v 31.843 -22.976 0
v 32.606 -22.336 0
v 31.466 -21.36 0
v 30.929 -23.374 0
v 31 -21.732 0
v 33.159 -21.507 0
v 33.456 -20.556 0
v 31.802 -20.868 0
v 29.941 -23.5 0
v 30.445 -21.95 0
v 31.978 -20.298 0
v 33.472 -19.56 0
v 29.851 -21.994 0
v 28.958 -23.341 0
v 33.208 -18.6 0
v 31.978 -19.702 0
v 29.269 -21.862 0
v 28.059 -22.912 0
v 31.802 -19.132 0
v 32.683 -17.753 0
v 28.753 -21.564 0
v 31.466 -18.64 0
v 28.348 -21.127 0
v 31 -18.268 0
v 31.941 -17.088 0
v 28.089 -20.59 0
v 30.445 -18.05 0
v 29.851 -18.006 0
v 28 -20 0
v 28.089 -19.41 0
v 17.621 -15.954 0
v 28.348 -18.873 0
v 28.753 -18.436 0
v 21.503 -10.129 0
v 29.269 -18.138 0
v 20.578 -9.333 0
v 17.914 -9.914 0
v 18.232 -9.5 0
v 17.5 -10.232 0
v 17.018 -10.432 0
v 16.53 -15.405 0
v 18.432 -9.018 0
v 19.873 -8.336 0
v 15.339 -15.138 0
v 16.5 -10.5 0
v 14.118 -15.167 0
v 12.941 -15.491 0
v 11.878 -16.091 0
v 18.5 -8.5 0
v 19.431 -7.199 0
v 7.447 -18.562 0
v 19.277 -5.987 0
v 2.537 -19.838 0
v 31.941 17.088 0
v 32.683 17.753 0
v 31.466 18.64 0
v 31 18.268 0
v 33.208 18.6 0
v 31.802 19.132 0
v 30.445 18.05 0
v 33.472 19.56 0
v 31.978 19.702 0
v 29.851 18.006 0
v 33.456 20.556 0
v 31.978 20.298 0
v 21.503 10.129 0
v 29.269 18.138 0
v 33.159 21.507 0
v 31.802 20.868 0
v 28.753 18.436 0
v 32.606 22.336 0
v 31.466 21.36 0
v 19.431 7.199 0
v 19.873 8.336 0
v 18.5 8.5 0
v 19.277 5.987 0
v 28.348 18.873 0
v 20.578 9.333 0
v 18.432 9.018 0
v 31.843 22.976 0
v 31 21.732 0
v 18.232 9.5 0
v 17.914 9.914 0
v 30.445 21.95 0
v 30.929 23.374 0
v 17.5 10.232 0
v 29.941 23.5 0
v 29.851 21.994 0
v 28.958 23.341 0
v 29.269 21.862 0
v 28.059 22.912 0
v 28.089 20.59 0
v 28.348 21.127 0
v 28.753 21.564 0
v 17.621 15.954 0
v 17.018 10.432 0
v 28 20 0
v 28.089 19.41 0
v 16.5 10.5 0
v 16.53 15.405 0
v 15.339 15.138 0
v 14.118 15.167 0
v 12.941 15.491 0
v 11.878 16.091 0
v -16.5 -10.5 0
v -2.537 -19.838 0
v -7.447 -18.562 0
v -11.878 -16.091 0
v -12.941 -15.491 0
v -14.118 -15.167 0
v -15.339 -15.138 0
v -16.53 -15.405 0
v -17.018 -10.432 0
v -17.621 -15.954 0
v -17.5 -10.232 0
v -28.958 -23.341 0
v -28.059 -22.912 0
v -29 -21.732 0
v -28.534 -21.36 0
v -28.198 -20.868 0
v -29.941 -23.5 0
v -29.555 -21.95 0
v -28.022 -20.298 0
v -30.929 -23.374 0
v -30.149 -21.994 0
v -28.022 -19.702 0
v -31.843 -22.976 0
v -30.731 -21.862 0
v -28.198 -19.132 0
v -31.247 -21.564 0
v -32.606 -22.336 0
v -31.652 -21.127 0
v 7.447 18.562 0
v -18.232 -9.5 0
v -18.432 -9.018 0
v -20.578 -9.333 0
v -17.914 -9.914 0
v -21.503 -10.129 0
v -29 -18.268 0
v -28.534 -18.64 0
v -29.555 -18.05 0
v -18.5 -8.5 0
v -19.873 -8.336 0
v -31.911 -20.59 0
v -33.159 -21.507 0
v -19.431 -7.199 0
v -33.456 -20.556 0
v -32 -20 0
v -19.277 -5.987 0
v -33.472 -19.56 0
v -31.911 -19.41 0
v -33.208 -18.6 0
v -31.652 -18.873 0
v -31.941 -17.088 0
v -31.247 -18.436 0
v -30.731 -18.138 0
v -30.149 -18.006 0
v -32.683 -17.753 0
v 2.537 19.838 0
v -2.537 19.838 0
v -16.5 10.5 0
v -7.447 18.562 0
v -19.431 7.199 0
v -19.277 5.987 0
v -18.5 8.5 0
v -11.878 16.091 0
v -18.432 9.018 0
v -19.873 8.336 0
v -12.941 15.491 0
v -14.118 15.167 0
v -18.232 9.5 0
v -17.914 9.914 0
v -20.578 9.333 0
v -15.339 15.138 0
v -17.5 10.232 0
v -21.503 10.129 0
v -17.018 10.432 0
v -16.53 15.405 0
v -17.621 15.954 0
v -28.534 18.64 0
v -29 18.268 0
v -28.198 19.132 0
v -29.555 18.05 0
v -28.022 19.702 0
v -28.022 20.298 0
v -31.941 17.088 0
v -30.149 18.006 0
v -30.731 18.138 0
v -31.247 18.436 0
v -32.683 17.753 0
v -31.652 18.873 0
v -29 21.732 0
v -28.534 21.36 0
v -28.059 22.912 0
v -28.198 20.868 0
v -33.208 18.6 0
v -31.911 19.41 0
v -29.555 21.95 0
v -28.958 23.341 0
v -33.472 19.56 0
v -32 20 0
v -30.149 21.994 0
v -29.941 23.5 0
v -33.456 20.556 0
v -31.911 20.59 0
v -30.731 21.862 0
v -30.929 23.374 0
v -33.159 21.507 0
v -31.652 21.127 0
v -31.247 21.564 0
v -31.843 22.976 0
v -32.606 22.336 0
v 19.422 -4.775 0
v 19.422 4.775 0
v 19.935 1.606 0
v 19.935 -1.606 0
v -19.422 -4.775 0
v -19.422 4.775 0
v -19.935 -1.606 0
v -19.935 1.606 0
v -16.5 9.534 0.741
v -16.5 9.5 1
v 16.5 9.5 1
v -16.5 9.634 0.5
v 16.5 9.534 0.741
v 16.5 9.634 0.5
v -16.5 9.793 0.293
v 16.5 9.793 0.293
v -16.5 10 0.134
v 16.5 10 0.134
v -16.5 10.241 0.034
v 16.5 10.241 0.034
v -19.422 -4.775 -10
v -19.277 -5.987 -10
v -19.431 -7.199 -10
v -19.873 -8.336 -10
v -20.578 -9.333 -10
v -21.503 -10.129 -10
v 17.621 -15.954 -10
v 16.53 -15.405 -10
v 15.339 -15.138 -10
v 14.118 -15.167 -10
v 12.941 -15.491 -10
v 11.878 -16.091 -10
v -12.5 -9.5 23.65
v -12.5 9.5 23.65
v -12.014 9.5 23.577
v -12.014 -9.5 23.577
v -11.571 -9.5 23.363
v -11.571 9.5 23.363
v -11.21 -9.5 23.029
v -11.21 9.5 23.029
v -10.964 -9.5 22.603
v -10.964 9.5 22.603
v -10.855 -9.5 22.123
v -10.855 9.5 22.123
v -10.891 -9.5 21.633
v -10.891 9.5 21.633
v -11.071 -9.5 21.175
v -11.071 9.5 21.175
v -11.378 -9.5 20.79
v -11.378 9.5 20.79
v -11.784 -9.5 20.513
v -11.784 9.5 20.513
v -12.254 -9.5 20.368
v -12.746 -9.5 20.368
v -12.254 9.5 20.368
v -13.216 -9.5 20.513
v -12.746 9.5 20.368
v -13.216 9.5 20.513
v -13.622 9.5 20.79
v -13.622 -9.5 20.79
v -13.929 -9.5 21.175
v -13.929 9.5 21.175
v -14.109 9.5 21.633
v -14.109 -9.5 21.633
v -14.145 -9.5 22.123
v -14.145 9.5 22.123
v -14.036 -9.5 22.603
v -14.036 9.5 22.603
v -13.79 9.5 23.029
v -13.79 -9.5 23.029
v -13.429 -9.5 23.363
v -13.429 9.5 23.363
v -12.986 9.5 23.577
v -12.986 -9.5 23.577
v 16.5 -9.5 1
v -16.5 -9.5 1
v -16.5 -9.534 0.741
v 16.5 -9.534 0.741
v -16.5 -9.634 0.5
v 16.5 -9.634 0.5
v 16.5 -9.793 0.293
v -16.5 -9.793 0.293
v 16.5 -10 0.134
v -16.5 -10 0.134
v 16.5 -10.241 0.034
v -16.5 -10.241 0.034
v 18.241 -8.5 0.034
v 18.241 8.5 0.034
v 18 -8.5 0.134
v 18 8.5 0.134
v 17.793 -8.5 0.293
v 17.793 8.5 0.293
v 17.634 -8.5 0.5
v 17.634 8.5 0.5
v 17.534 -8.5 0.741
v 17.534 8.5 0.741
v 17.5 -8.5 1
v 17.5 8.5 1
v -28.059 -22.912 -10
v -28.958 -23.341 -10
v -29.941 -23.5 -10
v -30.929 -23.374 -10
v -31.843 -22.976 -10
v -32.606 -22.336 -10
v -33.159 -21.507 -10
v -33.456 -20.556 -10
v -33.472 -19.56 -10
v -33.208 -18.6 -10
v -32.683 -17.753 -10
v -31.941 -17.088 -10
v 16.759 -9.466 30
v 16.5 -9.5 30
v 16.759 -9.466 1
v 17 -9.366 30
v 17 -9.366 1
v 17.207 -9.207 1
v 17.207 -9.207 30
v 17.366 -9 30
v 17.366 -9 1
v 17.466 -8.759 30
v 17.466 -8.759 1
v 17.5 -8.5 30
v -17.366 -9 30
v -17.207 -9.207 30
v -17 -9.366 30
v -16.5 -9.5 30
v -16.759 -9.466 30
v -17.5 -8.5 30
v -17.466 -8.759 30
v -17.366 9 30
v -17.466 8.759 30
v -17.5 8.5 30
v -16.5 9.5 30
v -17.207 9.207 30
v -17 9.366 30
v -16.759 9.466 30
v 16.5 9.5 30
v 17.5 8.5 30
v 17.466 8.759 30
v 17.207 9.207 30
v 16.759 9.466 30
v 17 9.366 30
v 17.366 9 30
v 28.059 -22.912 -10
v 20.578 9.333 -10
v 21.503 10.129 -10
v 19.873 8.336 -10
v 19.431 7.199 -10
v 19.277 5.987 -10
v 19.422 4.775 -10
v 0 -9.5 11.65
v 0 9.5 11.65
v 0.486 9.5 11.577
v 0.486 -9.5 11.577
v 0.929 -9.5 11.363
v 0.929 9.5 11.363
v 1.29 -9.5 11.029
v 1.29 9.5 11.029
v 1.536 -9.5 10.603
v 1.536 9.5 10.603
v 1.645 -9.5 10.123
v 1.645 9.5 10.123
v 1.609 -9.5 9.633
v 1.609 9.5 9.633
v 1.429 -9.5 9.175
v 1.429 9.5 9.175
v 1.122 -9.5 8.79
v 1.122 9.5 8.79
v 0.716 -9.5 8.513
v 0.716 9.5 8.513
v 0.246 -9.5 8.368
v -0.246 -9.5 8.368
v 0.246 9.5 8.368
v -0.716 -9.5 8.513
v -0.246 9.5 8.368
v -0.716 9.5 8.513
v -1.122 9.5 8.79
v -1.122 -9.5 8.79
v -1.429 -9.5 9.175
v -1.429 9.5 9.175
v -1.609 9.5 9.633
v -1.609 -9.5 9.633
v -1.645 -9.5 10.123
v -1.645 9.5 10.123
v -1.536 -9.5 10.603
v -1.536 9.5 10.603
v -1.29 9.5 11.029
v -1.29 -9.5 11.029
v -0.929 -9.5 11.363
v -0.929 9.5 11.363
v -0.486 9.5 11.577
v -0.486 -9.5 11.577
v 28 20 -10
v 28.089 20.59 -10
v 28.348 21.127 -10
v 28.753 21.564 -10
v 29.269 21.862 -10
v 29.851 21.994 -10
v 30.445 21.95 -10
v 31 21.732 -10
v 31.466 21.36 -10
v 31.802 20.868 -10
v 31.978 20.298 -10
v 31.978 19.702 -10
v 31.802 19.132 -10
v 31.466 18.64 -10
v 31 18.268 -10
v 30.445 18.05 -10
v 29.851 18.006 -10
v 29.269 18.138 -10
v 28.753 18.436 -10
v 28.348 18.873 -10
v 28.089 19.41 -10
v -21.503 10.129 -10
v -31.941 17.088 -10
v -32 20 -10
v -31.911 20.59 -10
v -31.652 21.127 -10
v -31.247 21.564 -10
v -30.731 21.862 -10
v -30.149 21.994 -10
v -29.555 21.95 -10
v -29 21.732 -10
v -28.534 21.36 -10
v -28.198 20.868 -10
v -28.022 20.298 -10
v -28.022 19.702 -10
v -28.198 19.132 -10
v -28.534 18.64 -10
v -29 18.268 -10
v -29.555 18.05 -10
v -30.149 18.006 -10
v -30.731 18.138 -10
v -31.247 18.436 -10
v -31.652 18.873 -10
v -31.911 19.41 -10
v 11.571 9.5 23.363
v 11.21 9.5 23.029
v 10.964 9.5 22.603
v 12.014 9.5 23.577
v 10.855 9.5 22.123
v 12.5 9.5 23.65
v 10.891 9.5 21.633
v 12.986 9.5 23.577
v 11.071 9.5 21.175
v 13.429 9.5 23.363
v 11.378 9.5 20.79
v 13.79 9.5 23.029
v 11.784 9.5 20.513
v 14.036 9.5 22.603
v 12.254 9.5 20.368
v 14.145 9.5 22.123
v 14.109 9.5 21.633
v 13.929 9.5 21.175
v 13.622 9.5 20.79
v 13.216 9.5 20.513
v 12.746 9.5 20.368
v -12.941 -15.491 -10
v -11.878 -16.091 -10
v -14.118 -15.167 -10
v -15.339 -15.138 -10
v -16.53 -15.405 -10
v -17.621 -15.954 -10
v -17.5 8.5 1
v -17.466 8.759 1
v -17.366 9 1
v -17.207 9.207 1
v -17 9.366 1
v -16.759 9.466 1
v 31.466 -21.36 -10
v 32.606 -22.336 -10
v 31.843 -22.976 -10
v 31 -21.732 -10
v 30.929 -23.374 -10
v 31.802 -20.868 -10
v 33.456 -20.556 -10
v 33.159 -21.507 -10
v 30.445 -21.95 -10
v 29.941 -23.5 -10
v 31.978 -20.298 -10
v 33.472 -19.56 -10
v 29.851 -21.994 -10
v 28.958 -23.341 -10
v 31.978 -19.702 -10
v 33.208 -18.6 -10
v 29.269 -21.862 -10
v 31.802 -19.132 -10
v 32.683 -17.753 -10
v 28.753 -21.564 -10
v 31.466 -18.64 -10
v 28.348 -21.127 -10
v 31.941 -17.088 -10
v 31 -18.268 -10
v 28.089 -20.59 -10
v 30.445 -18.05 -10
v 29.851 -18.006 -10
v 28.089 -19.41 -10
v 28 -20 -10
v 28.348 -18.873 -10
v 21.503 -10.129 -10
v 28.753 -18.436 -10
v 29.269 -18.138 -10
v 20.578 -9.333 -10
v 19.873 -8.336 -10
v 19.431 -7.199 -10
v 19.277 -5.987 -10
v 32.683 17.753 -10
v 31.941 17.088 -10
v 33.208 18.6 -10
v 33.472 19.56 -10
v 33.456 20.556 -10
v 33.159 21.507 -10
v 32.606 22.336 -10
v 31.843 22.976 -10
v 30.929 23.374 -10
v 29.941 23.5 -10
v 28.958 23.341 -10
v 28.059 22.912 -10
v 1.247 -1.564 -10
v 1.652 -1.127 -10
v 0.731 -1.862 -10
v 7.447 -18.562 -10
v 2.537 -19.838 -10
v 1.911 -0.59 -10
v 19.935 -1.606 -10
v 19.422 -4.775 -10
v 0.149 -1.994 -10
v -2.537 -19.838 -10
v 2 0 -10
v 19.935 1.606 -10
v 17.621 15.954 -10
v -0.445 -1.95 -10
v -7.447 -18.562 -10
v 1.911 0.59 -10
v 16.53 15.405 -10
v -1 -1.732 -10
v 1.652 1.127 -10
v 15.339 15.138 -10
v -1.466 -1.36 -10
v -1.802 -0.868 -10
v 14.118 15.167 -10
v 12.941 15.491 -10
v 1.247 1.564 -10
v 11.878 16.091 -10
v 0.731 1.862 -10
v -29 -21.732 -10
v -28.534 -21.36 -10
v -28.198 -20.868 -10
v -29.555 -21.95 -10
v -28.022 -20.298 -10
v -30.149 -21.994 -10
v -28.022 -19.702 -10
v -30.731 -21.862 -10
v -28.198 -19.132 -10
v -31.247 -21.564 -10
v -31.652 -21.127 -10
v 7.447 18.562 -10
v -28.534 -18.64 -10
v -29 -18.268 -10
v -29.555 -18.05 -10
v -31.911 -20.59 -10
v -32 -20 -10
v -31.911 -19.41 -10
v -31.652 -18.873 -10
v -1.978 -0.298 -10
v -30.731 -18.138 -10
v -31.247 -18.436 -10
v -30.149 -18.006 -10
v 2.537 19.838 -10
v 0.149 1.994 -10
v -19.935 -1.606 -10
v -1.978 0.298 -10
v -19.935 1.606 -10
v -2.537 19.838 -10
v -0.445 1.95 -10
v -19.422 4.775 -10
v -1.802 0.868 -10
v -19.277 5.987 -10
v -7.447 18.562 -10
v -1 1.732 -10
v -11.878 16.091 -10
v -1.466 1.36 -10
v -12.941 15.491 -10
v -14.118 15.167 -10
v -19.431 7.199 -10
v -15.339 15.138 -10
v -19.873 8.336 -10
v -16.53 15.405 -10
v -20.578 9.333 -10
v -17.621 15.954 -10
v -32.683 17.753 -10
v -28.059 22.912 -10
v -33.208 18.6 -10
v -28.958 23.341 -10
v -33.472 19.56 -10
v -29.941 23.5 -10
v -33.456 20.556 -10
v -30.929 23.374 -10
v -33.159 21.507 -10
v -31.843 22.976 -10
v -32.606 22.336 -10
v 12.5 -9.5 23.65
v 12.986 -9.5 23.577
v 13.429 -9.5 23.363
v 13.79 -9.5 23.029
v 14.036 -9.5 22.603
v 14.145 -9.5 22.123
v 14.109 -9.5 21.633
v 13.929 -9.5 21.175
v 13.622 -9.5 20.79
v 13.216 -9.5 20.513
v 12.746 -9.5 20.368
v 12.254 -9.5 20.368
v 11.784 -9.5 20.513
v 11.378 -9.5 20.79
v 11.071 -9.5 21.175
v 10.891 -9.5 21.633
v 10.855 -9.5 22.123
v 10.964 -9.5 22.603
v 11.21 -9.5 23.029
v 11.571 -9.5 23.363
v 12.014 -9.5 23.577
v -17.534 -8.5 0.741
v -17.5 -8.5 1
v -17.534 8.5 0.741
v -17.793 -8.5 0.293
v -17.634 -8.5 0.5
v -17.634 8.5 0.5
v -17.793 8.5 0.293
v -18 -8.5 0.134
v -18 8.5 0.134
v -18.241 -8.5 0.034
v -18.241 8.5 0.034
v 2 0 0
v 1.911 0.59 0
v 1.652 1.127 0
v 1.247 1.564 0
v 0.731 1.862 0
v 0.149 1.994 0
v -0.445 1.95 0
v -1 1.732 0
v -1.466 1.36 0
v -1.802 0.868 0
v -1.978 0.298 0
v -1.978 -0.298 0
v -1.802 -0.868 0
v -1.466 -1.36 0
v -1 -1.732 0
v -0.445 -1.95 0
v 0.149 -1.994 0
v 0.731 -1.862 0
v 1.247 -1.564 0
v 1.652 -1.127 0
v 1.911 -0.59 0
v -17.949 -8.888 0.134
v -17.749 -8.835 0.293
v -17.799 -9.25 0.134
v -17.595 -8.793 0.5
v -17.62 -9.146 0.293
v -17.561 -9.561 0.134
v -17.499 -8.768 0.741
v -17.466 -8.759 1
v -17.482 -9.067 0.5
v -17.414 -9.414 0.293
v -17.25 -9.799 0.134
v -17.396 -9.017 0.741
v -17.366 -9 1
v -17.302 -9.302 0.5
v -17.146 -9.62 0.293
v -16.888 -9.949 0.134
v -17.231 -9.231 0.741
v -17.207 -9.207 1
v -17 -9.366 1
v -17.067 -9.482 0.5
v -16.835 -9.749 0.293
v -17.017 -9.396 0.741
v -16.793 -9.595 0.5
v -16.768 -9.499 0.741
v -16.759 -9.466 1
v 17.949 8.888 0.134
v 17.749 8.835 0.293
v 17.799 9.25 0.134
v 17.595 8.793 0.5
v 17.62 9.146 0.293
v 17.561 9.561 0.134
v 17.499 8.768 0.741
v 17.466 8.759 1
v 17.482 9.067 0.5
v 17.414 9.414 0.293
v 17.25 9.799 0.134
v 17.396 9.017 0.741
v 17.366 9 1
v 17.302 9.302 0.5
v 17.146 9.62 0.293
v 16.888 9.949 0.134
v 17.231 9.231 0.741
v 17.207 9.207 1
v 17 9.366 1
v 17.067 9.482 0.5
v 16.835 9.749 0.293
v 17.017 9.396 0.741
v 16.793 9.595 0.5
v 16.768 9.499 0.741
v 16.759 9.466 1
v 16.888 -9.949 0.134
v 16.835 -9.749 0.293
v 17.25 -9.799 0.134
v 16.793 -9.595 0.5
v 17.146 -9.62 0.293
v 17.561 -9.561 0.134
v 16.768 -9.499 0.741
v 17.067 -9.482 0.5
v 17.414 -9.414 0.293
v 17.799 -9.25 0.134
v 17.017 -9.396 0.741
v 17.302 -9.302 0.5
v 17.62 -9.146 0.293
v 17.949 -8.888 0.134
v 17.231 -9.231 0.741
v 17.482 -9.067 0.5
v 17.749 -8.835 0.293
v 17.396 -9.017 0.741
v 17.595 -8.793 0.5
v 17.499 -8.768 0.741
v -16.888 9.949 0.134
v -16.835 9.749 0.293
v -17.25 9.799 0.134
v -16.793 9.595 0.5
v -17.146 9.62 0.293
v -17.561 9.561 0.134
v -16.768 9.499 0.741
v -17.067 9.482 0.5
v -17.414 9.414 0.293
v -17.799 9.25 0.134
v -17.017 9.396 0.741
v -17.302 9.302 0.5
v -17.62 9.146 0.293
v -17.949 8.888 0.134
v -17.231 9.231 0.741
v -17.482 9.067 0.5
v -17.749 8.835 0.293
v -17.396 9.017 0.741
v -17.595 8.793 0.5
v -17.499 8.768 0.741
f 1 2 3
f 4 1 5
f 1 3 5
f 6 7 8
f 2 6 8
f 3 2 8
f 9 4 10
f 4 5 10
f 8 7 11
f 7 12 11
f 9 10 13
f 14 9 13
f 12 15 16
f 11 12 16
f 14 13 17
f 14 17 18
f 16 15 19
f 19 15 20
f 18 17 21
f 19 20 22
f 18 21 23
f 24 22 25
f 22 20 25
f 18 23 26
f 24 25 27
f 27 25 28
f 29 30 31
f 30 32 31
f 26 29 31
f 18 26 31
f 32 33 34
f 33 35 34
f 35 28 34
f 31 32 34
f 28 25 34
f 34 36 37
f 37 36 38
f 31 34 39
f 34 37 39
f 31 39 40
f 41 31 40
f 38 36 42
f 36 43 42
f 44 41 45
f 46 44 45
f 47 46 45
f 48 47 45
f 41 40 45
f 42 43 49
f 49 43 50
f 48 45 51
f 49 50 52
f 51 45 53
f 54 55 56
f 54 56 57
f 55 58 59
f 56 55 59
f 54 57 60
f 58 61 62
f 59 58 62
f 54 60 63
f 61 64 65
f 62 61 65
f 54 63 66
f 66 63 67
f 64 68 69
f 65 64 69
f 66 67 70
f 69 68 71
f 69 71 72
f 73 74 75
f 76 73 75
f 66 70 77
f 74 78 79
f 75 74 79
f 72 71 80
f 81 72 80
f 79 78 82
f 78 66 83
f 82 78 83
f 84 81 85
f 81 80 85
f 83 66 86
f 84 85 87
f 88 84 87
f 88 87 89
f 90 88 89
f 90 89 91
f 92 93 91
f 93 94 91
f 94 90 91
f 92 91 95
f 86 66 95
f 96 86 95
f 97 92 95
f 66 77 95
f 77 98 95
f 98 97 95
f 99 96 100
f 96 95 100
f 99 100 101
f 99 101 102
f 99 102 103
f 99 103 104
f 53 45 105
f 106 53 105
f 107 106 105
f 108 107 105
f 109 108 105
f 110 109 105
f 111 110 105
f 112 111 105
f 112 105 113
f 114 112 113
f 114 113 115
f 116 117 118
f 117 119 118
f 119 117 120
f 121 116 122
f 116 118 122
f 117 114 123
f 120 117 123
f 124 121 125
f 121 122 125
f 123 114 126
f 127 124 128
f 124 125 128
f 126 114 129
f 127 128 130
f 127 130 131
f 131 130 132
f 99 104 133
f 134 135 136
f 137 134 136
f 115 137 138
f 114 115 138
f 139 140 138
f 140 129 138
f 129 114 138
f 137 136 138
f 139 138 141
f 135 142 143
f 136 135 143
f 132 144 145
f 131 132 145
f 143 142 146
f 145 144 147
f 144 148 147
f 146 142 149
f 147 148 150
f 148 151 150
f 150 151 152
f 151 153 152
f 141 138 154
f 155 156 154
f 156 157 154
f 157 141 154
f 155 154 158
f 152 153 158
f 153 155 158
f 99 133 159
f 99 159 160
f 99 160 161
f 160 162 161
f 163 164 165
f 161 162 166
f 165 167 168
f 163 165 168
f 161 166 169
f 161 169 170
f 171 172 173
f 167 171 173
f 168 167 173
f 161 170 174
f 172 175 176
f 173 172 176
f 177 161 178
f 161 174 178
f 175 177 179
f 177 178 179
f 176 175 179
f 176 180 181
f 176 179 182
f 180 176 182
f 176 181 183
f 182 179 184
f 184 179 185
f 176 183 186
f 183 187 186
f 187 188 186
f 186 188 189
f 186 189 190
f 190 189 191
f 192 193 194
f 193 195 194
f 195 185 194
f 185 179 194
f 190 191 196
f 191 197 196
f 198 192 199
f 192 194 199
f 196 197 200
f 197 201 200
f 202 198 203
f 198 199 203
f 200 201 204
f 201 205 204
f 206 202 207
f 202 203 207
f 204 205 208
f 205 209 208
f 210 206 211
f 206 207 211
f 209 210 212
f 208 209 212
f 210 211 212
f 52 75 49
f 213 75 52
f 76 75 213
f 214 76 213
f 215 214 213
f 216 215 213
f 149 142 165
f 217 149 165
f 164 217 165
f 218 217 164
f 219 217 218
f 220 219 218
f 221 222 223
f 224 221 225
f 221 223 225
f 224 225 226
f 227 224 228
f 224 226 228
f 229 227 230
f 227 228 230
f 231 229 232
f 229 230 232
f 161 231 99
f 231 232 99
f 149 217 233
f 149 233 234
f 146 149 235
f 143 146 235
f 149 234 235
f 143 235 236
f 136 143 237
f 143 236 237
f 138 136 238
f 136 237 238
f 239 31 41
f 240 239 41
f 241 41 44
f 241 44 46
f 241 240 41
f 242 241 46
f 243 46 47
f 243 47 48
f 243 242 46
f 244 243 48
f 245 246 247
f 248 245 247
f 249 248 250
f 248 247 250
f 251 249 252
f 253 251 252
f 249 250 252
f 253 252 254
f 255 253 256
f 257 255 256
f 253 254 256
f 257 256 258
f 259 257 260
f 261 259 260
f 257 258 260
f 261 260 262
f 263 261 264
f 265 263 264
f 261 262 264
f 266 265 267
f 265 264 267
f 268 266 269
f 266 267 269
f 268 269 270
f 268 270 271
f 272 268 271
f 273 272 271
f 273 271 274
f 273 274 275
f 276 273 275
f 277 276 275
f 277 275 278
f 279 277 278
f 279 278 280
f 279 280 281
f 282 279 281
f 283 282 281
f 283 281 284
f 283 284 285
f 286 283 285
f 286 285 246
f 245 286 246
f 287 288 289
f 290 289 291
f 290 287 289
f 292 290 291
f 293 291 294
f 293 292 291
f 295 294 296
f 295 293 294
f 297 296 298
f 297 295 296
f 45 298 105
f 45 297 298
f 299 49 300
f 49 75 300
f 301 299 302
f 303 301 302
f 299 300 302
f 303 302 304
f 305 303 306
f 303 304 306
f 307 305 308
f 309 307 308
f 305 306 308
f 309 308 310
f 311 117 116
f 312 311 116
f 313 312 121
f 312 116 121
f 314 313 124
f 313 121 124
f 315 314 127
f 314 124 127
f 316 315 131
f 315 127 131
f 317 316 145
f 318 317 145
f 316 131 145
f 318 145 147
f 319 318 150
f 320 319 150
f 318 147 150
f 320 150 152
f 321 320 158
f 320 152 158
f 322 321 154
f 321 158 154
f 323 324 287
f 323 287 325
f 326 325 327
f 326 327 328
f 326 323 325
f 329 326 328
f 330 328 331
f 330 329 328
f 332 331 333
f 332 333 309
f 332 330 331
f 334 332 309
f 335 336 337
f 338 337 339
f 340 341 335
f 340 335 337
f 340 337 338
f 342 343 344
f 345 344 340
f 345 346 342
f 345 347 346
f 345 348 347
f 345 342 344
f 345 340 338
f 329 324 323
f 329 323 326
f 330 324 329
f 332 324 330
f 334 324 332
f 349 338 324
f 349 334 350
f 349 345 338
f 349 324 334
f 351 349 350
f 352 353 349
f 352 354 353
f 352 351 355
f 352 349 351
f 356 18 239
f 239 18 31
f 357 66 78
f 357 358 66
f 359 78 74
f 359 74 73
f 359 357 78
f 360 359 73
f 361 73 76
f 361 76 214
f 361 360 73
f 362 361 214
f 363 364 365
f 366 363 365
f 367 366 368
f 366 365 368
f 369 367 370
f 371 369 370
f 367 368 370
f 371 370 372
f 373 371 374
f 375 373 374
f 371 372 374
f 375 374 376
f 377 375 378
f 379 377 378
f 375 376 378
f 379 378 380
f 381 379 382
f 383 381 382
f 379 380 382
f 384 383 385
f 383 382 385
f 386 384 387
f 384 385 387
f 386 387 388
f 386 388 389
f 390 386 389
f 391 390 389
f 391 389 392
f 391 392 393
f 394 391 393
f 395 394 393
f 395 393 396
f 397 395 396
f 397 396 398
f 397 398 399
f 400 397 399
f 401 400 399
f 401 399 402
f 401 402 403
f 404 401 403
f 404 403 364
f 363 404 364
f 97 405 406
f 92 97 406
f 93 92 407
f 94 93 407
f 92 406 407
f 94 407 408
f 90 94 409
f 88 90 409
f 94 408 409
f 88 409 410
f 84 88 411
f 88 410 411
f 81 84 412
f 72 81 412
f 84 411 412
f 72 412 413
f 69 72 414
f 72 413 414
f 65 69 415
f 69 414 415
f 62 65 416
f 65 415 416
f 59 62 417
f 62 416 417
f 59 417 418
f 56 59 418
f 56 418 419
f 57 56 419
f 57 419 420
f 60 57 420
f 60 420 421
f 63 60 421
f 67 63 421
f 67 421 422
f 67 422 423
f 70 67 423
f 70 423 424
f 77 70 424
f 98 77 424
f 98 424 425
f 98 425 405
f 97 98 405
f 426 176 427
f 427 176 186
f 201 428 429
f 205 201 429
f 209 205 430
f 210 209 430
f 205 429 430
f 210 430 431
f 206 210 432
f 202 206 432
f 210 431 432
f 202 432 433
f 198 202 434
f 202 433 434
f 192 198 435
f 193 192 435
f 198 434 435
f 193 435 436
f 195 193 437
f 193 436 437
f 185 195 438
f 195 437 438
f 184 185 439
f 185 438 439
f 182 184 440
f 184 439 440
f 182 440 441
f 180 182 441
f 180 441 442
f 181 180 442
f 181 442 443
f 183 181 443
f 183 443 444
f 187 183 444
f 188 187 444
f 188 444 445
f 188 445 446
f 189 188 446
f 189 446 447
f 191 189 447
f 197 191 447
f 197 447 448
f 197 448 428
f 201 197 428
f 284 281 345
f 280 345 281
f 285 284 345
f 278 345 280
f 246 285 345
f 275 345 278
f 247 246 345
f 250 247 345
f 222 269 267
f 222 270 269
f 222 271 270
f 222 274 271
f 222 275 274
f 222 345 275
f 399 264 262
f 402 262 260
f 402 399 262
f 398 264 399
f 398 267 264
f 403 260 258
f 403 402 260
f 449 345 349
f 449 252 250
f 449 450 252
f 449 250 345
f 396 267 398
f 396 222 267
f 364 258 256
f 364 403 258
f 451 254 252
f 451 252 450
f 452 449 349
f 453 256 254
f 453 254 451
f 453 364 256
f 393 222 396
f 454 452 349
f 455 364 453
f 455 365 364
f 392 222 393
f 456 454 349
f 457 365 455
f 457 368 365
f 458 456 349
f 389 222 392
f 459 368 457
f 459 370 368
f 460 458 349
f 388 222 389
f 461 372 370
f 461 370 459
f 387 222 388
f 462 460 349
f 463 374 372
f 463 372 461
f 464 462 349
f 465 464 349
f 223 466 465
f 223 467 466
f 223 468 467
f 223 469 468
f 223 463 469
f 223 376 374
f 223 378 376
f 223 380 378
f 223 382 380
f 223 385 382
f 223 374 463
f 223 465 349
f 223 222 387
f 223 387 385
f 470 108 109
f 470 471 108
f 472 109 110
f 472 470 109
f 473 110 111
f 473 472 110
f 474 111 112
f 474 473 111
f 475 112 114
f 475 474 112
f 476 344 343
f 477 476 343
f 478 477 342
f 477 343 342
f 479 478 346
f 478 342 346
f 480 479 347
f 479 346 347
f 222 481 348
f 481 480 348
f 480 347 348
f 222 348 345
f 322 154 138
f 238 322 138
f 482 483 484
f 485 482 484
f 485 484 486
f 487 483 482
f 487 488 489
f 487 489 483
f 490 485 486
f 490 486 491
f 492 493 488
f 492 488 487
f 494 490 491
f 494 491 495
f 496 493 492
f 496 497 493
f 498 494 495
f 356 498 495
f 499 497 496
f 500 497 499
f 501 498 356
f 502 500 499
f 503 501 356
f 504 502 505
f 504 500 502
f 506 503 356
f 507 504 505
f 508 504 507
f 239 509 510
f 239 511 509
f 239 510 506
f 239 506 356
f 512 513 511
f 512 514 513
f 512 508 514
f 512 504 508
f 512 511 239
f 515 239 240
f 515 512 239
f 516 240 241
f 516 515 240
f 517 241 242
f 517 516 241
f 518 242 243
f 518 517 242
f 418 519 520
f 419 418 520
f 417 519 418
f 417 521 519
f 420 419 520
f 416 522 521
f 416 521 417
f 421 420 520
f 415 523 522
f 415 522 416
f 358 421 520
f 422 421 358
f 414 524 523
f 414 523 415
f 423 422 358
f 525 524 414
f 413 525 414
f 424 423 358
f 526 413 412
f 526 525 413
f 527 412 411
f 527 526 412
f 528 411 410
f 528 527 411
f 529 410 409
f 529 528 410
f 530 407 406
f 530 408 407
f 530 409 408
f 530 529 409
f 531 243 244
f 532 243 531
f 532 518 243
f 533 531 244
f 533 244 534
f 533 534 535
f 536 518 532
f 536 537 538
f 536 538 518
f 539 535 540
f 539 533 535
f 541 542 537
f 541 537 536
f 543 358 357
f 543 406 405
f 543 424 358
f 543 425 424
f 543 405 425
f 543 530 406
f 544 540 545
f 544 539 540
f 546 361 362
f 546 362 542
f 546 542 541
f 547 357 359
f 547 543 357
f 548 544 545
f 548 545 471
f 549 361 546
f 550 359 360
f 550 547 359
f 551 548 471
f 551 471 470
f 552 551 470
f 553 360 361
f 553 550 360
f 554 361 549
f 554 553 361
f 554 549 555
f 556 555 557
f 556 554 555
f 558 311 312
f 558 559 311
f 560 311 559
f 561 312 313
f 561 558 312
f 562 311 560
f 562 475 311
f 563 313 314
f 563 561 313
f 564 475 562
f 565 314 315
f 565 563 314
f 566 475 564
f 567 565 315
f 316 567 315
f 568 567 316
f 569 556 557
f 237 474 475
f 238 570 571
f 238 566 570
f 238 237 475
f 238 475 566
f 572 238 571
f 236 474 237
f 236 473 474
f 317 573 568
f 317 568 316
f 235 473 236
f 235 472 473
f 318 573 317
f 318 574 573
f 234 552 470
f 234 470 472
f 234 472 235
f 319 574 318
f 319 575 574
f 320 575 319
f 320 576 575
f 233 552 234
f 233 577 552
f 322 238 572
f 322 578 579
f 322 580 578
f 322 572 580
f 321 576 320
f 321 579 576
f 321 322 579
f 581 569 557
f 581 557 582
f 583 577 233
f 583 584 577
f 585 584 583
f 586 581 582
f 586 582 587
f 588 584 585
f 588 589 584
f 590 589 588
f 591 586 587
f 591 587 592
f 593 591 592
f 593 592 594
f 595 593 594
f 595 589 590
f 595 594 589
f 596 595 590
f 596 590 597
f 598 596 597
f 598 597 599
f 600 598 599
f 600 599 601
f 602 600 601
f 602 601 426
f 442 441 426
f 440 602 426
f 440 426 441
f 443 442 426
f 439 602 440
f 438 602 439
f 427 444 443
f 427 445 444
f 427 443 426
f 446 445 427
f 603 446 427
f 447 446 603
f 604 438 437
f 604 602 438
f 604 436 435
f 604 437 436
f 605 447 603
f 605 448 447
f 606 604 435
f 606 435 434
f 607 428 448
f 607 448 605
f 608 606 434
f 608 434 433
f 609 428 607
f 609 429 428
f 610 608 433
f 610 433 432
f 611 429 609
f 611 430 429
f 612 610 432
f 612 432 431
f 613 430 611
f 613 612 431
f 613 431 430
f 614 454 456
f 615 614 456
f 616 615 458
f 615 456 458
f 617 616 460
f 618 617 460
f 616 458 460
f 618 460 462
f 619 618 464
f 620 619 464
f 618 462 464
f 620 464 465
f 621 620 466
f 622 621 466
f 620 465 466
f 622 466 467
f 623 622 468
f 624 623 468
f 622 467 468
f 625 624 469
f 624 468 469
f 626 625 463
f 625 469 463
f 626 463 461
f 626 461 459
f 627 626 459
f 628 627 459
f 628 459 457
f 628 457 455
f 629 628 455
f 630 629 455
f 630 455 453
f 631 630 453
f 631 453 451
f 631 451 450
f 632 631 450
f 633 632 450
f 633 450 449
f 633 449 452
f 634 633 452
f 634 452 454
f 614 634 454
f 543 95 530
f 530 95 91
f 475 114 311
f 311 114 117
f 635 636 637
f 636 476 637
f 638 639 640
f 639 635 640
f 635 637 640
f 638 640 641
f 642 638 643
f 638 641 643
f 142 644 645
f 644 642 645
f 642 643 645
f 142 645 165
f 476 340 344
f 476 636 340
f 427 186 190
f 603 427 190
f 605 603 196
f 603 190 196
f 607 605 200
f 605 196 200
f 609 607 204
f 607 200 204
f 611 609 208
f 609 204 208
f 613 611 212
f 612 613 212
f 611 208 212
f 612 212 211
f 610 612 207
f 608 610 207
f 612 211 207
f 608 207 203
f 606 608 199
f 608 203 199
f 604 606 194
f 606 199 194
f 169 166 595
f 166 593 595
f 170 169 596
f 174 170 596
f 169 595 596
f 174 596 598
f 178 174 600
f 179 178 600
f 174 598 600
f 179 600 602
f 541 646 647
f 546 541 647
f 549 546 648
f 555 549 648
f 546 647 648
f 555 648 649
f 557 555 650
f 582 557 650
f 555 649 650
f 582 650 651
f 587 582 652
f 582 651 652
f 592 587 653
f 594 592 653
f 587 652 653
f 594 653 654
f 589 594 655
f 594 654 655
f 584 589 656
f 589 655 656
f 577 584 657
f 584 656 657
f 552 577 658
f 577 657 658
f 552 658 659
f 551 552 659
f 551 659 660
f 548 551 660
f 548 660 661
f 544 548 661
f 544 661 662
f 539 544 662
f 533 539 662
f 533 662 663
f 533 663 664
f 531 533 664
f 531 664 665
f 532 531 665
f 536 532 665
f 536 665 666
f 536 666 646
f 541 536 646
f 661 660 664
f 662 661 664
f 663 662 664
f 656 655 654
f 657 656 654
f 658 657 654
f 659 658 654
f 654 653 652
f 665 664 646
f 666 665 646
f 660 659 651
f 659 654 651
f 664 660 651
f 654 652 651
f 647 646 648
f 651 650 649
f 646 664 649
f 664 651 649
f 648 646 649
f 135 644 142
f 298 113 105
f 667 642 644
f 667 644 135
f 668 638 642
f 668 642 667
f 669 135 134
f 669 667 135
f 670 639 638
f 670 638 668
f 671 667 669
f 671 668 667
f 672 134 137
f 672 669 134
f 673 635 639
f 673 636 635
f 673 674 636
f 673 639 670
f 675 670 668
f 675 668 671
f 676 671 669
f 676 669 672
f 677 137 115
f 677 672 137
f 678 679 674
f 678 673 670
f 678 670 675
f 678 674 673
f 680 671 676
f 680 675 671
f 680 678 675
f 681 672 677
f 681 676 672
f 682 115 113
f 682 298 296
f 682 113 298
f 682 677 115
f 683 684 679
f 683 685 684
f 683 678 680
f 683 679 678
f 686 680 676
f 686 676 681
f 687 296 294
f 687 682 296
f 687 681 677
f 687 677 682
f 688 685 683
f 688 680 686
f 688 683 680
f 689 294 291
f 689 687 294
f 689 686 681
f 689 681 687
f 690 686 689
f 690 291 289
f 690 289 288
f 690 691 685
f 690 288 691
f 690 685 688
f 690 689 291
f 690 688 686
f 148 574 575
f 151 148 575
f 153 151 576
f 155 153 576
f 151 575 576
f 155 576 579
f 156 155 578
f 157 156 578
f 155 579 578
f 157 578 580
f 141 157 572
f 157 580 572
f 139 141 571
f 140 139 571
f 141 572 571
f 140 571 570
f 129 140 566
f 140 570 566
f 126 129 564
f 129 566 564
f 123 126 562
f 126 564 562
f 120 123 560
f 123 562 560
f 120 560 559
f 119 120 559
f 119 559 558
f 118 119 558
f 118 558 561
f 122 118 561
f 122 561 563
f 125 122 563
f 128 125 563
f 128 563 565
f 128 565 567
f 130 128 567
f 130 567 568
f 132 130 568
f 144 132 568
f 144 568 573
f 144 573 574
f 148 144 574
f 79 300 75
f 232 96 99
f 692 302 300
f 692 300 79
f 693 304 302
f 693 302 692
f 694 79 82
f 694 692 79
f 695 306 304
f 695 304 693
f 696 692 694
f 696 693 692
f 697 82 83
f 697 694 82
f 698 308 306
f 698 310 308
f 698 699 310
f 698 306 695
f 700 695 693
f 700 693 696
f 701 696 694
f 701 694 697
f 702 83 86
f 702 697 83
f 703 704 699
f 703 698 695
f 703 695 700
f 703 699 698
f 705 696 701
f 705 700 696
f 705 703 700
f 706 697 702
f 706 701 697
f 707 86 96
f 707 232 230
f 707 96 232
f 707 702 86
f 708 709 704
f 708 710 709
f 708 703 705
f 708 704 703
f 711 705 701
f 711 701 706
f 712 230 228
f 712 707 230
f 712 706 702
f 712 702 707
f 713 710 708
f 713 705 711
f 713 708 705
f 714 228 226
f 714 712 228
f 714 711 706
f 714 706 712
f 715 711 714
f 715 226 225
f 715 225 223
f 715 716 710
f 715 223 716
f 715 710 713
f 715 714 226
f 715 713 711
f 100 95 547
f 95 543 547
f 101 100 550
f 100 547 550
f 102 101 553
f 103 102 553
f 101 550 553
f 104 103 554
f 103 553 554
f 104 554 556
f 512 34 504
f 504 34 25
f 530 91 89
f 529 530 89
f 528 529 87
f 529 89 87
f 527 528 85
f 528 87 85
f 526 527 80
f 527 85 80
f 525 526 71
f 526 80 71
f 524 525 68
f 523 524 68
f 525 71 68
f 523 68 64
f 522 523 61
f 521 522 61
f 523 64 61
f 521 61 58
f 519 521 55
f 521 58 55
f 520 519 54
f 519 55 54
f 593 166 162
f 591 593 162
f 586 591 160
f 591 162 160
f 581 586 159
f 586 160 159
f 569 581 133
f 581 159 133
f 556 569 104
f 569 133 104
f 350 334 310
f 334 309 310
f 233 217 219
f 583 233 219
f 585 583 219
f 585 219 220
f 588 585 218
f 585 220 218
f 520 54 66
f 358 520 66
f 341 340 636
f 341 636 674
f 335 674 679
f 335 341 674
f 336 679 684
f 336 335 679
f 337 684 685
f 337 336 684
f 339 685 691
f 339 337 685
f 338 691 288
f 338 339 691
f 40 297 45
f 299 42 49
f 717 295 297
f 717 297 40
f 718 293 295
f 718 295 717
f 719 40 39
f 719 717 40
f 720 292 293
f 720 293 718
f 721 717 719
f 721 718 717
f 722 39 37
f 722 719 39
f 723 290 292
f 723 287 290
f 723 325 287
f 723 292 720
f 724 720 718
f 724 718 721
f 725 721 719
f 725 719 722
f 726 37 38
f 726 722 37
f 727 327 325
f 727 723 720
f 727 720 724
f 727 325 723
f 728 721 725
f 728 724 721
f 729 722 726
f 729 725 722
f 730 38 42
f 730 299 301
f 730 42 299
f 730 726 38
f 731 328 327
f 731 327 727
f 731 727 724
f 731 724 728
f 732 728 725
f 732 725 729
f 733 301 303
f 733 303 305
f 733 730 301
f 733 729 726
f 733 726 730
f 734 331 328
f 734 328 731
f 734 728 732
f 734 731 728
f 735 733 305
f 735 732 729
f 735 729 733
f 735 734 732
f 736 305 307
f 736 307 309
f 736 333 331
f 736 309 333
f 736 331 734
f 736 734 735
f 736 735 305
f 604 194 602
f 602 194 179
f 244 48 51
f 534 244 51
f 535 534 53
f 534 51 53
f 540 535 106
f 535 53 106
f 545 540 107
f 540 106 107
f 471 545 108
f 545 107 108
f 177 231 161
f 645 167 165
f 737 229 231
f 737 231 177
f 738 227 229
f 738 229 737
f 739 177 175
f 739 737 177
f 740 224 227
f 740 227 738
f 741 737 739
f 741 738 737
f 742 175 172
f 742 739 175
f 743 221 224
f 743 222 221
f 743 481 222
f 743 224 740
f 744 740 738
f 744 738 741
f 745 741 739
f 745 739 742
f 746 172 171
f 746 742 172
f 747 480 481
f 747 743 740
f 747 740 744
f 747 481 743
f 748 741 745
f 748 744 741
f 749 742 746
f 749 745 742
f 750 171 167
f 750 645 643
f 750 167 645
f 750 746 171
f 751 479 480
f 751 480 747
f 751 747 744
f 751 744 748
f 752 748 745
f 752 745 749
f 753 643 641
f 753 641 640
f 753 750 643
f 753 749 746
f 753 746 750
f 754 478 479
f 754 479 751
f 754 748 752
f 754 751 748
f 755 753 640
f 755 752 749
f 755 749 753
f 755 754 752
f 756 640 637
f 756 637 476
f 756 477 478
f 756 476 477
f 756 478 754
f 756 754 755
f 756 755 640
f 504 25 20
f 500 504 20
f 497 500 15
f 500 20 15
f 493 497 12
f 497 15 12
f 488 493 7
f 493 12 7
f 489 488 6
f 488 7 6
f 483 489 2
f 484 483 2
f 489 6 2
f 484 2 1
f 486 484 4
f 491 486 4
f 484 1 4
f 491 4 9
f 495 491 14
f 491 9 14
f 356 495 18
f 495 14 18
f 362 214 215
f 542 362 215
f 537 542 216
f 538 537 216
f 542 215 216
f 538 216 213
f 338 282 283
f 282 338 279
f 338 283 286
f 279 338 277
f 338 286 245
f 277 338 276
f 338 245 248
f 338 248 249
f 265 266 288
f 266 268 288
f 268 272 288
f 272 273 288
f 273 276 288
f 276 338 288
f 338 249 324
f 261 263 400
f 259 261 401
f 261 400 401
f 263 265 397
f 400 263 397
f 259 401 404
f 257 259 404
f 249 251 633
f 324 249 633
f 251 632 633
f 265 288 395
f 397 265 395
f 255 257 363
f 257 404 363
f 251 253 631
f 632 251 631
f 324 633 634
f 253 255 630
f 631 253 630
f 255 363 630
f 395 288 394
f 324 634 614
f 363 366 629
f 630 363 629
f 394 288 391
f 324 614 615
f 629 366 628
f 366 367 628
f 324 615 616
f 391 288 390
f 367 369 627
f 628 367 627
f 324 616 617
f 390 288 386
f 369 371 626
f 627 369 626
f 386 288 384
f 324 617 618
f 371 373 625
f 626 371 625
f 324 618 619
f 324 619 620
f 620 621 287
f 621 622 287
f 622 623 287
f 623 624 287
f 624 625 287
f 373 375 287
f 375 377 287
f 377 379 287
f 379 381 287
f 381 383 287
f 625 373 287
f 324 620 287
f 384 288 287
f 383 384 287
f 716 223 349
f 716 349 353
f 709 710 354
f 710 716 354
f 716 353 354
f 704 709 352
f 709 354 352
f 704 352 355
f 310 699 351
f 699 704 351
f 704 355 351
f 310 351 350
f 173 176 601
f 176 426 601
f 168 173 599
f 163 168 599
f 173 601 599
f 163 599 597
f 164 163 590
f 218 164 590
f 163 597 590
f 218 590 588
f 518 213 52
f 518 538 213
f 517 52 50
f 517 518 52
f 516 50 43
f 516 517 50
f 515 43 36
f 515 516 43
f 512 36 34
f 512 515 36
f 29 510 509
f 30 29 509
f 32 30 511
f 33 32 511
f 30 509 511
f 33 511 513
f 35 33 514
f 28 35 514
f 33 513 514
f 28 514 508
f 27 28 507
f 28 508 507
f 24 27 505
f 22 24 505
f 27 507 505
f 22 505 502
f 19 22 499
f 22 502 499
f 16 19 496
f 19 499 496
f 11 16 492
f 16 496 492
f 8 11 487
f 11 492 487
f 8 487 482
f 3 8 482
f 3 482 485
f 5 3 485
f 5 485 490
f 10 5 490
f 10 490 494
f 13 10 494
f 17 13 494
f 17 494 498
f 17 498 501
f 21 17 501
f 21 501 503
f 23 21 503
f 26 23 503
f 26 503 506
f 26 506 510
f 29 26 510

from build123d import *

# Parameters (mm, degrees)
BASE_FLANGE1_DEPTH        = 10
F_4_0MM_DOWEL_HOLE1_D     = 4
F_4_0MM_DOWEL_HOLE1_DEPTH = 16
F_4_0MM_DOWEL_HOLE1_TIP   = 1.201721238
FILLET1_R                 = 5
F_4_0MM_DOWEL_HOLE2_D     = 4
F_4_0MM_DOWEL_HOLE2_DEPTH = 16
F_4_0MM_DOWEL_HOLE2_TIP   = 1.201721238
SKETCH17_W                = 35
SKETCH17_H                = 19
BOSS_EXTRUDE1_DEPTH       = 30
SKETCH18_R                = 1.65
CUT_EXTRUDE1_DEPTH        = 56.778580118
FILLET2_R                 = 1


# Sheet-metal steps are written as plain solids
with BuildPart() as part:
    # Sketch1 → Base-Flange1 (new body)
    with BuildSketch(Plane.XY):
        with BuildLine():
            Line((14.442758409, 13.834982094), (28.058549313, 22.91217603))
            ThreePointArc((28.058549313, 22.91217603), (32.91217603, 21.941450687), (31.941450687, 17.08782397))
            Line((31.941450687, 17.08782397), (18.325659783, 8.010630034))
            ThreePointArc((18.325659783, 8.010630034), (20, 0), (18.325659783, -8.010630034))
            Line((18.325659783, -8.010630034), (31.941450687, -17.08782397))
            ThreePointArc((31.941450687, -17.08782397), (32.91217603, -21.941450687), (28.058549313, -22.91217603))
            Line((28.058549313, -22.91217603), (14.442758409, -13.834982094))
            ThreePointArc((14.442758409, -13.834982094), (0, -20), (-14.442758409, -13.834982094))
            Line((-14.442758409, -13.834982094), (-28.058549313, -22.91217603))
            ThreePointArc((-28.058549313, -22.91217603), (-32.91217603, -21.941450687), (-31.941450687, -17.08782397))
            Line((-31.941450687, -17.08782397), (-18.325659783, -8.010630034))
            ThreePointArc((-18.325659783, -8.010630034), (-20, 0), (-18.325659783, 8.010630034))
            Line((-18.325659783, 8.010630034), (-31.941450687, 17.08782397))
            ThreePointArc((-31.941450687, 17.08782397), (-32.91217603, 21.941450687), (-28.058549313, 22.91217603))
            Line((-28.058549313, 22.91217603), (-14.442758409, 13.834982094))
            ThreePointArc((-14.442758409, 13.834982094), (0, 20), (14.442758409, 13.834982094))
        make_face()
    extrude(amount=-BASE_FLANGE1_DEPTH)

    # Ø4.0mm Dowel Hole1
    with Locations(Plane.XY):
        with Locations((-30, 20), (30, -20), (-30, -20), (30, 20)):
            Hole(F_4_0MM_DOWEL_HOLE1_D / 2, depth=F_4_0MM_DOWEL_HOLE1_DEPTH)
            with Locations((0, 0, -(F_4_0MM_DOWEL_HOLE1_DEPTH + F_4_0MM_DOWEL_HOLE1_TIP / 2))):  # 118° drill point
                Cone(0, F_4_0MM_DOWEL_HOLE1_D / 2, F_4_0MM_DOWEL_HOLE1_TIP, mode=Mode.SUBTRACT)

    # Fillet1
    fillet1_edges = [part.edges().sort_by_distance(p)[0] for p in [
        (18.325659783, 8.010630034, -5),
        (18.325659783, -8.010630034, -5),
        (14.442758409, -13.834982094, -5),
        (-14.442758409, -13.834982094, -5),
        (-18.325659783, -8.010630034, -5),
        (-18.325659783, 8.010630034, -5),
        (-14.442758409, 13.834982094, -5),
        (14.442758409, 13.834982094, -5),
    ]]
    fillet(fillet1_edges, radius=FILLET1_R)

    # Ø4.0mm Dowel Hole2
    with Locations(Plane(origin=(0, 0, -10), x_dir=(-1, 0, 0), z_dir=(0, 0, -1))):
        with Locations((0, 0)):
            Hole(F_4_0MM_DOWEL_HOLE2_D / 2, depth=F_4_0MM_DOWEL_HOLE2_DEPTH)
            with Locations((0, 0, -(F_4_0MM_DOWEL_HOLE2_DEPTH + F_4_0MM_DOWEL_HOLE2_TIP / 2))):  # 118° drill point
                Cone(0, F_4_0MM_DOWEL_HOLE2_D / 2, F_4_0MM_DOWEL_HOLE2_TIP, mode=Mode.SUBTRACT)

    # Sketch17 → Boss-Extrude1 (add)
    with BuildSketch(Plane.XY):
        Rectangle(SKETCH17_W, SKETCH17_H)
    extrude(amount=BOSS_EXTRUDE1_DEPTH)

    # Sketch18 → Cut-Extrude1 (cut, through all)
    with BuildSketch(Plane(origin=(0, 9.5, 0), x_dir=(1, 0, 0), z_dir=(0, 1, 0))):
        with Locations(Location((0, -10, 0), (0, 0, 270))):
            Circle(SKETCH18_R)
        with Locations(Location((-12.5, -22, 0), (0, 0, 270))):
            Circle(SKETCH18_R)
        with Locations(Location((12.5, -22, 0), (0, 0, 270))):
            Circle(SKETCH18_R)
    extrude(amount=-CUT_EXTRUDE1_DEPTH, mode=Mode.SUBTRACT)

    # Fillet2
    fillet2_edges = [part.edges().sort_by_distance(p)[0] for p in [
        (17.5, 0, 0),
        (17.5, -9.5, 15),
        (0, 9.5, 0),
        (17.5, 9.5, 15),
        (-17.5, 0, 0),
        (-17.5, 9.5, 15),
        (0, -9.5, 0),
        (-17.5, -9.5, 15),
    ]]
    fillet(fillet2_edges, radius=FILLET2_R)


solid = part.part
